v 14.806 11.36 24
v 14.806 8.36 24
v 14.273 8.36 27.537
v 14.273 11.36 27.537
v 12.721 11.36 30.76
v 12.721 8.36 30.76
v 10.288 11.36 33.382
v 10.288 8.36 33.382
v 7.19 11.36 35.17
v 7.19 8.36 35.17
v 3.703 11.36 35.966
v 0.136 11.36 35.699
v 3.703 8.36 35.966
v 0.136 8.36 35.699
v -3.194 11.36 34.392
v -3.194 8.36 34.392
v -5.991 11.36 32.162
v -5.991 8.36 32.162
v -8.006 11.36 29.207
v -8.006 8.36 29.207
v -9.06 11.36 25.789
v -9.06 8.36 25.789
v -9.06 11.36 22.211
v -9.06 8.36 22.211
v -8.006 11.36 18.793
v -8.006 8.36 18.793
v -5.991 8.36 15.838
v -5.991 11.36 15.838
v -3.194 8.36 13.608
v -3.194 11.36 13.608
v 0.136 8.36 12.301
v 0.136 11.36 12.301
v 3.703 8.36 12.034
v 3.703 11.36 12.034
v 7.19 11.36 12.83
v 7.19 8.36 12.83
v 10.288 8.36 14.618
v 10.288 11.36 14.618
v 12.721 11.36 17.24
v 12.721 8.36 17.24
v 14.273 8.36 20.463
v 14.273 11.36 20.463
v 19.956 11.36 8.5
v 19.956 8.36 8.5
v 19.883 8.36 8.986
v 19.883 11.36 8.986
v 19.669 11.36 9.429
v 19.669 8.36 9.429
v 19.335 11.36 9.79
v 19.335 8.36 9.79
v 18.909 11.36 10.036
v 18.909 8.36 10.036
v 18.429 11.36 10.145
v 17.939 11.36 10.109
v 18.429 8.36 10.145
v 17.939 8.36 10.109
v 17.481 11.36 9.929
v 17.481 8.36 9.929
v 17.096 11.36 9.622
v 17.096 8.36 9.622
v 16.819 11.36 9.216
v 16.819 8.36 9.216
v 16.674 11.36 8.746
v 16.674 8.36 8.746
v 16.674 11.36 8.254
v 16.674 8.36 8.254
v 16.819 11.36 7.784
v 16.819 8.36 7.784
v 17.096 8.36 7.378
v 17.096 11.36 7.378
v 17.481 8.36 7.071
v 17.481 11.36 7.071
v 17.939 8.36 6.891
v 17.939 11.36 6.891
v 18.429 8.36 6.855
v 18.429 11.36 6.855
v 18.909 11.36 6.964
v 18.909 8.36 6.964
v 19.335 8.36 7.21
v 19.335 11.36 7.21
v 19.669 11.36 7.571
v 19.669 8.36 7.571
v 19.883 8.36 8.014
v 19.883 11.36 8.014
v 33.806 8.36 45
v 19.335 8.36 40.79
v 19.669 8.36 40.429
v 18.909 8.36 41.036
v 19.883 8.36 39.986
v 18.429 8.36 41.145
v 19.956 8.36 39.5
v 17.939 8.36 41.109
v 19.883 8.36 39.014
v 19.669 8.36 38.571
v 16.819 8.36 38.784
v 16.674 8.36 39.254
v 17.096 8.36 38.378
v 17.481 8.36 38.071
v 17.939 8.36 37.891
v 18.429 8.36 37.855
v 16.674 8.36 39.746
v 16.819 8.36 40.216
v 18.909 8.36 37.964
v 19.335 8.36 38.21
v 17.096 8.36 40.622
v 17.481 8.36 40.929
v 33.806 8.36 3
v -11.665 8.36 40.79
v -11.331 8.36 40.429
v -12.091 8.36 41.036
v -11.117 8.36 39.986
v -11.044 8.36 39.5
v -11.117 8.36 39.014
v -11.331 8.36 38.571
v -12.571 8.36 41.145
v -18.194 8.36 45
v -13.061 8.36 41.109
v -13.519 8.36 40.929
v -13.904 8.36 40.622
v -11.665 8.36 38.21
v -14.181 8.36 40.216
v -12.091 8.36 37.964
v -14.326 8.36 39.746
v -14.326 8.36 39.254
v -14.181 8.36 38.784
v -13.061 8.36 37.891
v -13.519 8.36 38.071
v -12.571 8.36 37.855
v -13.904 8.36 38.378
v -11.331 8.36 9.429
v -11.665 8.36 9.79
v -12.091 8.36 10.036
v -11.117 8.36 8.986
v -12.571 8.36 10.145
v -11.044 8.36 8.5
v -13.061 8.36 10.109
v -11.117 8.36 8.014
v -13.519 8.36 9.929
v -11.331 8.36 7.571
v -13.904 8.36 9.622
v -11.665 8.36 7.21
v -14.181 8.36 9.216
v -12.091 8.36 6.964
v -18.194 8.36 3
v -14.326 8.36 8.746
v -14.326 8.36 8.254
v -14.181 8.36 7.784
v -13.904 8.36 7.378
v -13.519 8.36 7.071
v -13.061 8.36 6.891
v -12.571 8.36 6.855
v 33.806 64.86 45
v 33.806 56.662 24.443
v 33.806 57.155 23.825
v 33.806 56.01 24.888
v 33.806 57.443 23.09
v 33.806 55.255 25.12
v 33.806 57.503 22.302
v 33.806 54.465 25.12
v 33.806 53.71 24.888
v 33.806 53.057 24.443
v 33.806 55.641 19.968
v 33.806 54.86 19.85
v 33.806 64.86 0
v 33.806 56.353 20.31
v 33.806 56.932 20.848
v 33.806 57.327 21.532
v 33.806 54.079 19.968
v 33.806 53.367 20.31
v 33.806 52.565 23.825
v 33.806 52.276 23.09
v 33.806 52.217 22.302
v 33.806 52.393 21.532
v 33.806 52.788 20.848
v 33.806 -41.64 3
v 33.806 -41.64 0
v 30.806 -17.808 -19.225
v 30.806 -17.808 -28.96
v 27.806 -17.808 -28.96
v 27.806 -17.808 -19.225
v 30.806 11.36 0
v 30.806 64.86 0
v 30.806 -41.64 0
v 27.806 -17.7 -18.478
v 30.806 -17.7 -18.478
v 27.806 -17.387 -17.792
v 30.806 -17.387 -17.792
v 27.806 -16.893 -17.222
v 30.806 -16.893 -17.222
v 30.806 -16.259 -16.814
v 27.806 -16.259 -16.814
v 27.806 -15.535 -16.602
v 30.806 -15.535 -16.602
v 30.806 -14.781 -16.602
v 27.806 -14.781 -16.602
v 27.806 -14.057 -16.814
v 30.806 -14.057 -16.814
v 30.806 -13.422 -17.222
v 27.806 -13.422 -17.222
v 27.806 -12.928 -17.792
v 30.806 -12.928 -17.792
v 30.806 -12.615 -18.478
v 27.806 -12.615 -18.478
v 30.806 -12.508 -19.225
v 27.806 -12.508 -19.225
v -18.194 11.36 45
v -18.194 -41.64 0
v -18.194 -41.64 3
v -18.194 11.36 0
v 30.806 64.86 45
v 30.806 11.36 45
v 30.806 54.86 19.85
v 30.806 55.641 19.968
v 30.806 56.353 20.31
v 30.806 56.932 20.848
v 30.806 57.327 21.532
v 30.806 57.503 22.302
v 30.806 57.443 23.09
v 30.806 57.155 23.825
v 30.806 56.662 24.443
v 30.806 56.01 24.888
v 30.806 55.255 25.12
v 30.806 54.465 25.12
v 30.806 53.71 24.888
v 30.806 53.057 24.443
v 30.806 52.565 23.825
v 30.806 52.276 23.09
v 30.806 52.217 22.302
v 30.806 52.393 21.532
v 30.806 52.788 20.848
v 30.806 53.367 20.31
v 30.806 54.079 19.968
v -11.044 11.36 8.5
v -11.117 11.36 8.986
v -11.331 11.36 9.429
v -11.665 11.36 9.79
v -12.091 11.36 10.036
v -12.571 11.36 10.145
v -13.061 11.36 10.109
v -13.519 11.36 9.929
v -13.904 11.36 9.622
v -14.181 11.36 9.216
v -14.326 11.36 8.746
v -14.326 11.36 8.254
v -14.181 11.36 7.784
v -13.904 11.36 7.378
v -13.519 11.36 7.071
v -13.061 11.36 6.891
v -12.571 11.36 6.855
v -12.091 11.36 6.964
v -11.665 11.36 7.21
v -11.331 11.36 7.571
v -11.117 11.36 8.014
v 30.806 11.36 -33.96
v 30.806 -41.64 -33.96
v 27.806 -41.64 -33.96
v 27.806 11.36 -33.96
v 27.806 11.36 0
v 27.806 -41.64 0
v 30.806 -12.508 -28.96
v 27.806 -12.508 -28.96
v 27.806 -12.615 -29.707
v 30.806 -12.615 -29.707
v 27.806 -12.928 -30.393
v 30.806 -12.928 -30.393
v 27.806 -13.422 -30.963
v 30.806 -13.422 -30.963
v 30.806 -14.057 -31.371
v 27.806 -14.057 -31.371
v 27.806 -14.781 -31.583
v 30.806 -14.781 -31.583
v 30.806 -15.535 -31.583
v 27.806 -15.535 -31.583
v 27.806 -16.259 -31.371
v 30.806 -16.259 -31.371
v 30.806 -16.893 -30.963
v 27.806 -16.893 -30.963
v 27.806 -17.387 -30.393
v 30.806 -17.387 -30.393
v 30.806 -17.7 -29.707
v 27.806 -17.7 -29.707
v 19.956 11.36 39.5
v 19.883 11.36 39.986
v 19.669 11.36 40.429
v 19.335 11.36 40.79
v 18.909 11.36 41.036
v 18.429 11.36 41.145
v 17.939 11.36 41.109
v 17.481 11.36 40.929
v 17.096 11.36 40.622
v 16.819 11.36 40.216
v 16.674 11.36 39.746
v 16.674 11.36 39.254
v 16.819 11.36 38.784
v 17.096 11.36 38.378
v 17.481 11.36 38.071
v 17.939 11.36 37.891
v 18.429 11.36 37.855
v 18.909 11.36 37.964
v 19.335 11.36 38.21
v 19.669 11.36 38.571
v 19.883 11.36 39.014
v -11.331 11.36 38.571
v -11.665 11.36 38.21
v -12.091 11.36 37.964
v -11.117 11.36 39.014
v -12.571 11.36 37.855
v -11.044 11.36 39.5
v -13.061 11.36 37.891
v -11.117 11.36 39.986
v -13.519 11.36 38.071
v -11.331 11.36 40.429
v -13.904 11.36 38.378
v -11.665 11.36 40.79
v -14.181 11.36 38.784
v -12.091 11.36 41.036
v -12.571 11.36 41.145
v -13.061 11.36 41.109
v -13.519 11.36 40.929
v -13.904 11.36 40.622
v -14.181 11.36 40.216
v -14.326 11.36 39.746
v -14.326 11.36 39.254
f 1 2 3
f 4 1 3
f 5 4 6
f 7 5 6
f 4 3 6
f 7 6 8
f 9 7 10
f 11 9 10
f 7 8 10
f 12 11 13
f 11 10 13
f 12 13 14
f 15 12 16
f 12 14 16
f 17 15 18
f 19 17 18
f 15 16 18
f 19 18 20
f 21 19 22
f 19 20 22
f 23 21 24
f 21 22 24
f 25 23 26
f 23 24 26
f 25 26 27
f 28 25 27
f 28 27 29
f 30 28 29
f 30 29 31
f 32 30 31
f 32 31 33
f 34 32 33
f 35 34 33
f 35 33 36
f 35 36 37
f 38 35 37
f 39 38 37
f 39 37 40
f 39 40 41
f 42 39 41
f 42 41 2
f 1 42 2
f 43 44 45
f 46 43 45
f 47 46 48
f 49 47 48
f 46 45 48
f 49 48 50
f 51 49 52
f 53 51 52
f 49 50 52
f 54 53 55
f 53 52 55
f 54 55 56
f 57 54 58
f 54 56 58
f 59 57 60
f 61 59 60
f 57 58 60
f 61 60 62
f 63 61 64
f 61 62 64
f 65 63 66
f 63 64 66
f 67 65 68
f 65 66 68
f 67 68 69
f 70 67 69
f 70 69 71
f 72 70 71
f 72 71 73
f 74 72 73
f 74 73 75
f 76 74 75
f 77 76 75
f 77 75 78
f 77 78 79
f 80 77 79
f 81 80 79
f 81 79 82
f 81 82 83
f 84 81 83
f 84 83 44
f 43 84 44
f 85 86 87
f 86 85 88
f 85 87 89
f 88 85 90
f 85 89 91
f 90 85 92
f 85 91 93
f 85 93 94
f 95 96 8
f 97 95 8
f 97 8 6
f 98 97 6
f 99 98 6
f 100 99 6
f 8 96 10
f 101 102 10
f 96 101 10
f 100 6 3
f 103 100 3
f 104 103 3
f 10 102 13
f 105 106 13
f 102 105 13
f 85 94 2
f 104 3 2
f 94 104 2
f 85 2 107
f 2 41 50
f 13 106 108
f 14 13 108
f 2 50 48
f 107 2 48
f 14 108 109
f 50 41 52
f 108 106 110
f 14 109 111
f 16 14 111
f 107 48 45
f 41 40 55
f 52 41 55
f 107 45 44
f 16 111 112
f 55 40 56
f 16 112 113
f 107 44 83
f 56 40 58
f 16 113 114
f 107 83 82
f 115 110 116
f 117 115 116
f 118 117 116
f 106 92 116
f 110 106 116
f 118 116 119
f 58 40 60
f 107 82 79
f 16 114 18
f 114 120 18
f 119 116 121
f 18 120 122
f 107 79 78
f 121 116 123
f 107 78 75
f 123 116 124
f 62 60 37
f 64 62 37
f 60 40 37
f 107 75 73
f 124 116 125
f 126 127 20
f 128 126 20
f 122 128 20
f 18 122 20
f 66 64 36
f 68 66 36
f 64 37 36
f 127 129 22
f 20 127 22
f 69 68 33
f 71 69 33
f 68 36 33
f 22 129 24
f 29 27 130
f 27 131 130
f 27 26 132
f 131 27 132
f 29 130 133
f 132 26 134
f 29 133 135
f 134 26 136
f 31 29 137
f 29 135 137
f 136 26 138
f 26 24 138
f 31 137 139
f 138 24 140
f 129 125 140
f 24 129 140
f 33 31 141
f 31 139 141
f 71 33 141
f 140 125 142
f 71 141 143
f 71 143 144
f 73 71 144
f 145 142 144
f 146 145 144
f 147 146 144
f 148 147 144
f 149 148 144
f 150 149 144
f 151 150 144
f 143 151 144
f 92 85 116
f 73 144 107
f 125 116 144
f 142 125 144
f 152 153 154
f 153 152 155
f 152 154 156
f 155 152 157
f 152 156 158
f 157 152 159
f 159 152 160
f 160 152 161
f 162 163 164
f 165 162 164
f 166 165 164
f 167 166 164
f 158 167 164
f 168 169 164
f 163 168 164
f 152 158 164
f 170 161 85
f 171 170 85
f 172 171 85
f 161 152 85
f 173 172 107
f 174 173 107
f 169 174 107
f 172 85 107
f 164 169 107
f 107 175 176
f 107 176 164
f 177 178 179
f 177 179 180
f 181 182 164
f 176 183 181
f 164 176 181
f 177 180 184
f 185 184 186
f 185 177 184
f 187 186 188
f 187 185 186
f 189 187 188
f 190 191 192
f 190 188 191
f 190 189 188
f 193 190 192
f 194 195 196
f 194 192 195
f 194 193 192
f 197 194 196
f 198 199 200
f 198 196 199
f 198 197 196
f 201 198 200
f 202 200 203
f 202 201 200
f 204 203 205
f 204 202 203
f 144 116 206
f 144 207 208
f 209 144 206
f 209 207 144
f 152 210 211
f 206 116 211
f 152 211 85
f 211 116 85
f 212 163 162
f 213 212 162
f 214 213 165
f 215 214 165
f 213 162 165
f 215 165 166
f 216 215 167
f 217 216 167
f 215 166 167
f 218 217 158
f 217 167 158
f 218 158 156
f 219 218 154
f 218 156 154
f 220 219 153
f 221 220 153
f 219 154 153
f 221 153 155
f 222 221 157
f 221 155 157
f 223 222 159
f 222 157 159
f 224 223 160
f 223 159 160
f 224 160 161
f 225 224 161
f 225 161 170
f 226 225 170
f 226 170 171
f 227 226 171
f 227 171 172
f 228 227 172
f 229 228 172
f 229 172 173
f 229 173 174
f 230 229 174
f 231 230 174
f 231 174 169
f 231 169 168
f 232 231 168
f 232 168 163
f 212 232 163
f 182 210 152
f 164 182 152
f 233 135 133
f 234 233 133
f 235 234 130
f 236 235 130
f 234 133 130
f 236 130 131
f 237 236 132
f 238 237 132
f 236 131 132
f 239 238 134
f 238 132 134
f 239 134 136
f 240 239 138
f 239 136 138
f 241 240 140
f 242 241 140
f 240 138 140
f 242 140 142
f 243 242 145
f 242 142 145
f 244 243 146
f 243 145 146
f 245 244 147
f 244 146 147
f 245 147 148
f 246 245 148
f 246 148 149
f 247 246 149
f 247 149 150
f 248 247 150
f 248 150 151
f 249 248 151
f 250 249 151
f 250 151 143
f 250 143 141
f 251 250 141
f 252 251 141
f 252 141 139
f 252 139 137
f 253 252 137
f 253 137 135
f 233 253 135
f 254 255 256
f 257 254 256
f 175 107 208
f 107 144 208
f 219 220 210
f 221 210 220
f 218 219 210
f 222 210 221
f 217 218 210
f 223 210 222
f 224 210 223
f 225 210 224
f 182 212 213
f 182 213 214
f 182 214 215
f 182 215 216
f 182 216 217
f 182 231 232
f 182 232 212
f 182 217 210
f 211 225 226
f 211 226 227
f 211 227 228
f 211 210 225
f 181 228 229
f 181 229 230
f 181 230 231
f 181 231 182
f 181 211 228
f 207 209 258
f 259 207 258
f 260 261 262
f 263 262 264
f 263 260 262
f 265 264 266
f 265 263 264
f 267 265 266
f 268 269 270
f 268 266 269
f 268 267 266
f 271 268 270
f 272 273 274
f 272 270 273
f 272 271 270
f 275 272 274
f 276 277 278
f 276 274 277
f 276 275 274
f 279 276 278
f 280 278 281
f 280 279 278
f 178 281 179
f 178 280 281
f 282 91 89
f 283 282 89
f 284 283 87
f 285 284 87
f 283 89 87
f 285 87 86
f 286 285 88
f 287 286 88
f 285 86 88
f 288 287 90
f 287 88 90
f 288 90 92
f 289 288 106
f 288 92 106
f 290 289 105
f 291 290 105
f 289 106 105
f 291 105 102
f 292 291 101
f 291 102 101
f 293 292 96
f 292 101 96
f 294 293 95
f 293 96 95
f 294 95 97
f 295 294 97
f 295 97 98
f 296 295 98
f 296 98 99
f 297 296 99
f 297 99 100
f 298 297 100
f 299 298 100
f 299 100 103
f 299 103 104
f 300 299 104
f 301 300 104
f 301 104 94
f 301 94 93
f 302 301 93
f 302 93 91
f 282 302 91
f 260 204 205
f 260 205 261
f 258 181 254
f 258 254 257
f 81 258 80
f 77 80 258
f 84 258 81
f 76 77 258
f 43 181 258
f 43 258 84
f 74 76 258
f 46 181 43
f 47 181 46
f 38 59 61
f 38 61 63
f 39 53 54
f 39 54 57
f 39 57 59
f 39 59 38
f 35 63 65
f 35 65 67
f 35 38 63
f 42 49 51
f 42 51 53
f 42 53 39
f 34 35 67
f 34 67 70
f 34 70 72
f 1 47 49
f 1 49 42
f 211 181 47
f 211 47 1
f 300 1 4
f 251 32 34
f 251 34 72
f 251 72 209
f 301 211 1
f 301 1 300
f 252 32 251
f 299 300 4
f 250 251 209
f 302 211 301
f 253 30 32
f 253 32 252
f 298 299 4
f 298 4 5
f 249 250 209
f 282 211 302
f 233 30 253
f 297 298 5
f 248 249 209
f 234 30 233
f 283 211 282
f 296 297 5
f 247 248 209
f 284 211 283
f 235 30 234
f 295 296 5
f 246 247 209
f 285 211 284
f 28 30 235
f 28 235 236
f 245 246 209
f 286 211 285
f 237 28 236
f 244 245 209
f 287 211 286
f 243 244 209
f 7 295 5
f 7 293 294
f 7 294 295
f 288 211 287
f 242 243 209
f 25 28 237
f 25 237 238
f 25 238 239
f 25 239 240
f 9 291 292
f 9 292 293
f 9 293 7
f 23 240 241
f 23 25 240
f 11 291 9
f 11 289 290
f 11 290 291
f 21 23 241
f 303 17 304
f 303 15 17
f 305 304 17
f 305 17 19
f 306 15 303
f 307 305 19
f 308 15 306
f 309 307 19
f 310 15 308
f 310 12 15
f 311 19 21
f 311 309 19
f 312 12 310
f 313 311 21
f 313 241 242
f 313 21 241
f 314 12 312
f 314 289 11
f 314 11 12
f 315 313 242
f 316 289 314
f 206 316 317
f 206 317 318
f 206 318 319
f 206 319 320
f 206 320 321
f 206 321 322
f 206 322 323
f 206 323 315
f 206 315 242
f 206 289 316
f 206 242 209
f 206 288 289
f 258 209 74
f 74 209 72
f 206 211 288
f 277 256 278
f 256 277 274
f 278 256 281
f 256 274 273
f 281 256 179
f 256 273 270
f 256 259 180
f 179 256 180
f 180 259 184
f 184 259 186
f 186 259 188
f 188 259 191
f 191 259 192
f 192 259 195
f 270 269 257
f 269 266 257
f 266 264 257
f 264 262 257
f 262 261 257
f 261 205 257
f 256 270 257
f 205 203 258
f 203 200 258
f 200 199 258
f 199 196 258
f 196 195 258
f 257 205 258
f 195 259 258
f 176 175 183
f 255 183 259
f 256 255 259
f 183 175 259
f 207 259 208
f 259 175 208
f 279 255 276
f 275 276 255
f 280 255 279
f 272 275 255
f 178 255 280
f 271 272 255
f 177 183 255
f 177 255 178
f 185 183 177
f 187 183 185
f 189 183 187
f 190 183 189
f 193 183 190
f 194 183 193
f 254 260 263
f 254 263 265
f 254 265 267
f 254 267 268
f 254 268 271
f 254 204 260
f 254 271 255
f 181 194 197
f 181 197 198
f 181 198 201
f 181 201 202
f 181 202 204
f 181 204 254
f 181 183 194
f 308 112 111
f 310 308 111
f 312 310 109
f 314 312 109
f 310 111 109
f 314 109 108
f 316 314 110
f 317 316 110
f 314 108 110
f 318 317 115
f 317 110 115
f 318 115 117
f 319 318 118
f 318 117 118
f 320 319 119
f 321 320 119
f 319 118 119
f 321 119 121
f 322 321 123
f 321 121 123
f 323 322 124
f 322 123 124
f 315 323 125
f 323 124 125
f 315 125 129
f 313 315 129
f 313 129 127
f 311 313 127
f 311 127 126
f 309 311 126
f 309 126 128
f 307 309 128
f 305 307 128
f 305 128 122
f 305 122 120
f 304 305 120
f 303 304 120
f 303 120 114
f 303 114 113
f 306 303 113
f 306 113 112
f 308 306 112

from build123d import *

# Parameters (mm, degrees)
SKETCH_1_W          = 42
SKETCH_1_H          = 53
EXTRUDE_1_DEPTH     = 3
SKETCH_2_W          = 42
SKETCH_2_H          = 3
EXTRUDE_2_DEPTH     = 42
SKETCH_3_R          = 12
SKETCH_3_R_2        = 1.65
CUT_EXTRUDE_1_DEPTH = 4
EXTRUDE_3_DEPTH     = 10
SKETCH_5_W          = 3
SKETCH_5_H          = 45
EXTRUDE_4_DEPTH     = 53.5
SKETCH_6_R          = 2.65
CUT_EXTRUDE_2_DEPTH = 20
SKETCH_7_W          = 3
SKETCH_7_H          = 53
EXTRUDE_5_DEPTH     = 33.96
CUT_EXTRUDE_4_DEPTH = 33.96


with BuildPart() as part:
    # 草图1 → 凸台-拉伸1 (new body)
    with BuildSketch(Plane.XY):
        with Locations((2.806034483, -15.140086207)):
            Rectangle(SKETCH_1_W, SKETCH_1_H)
    extrude(amount=EXTRUDE_1_DEPTH)

    # 草图2 → 凸台-拉伸2 (add)
    with BuildSketch(Plane.XY.offset(3)):
        with Locations((2.806034483, 9.859913793)):
            Rectangle(SKETCH_2_W, SKETCH_2_H)
    extrude(amount=EXTRUDE_2_DEPTH)

    # 草图3 → 切除-拉伸1 (cut, through all)
    with BuildSketch(Plane.XZ.offset(-8.359913793)):
        with Locations((2.806034483, 24)):
            Circle(SKETCH_3_R)
        with Locations((18.306034483, 39.5)):
            Circle(SKETCH_3_R_2)
        with Locations((18.306034483, 8.5)):
            Circle(SKETCH_3_R_2)
        with Locations((-12.693965517, 8.5)):
            Circle(SKETCH_3_R_2)
        with Locations((-12.693965517, 39.5)):
            Circle(SKETCH_3_R_2)
    extrude(amount=-CUT_EXTRUDE_1_DEPTH, mode=Mode.SUBTRACT)

    # 草图4 → 凸台-拉伸3 (add)
    with BuildSketch(Plane(origin=(23.806034483, 0, 0), x_dir=(0, 0, -1), z_dir=(1, 0, 0))):
        Polygon((-45, 8.359913793), (-3, 8.359913793), (-3, -41.640086207), (0, -41.640086207), (0, 8.359913793), (0, 11.359913793), (-45, 11.359913793), align=None)
    extrude(amount=EXTRUDE_3_DEPTH)

    # 草图5 → 凸台-拉伸4 (add)
    with BuildSketch(Plane(origin=(0, 11.359913793, 0), x_dir=(1, 0, 0), z_dir=(0, 1, 0))):
        with Locations((32.306034483, -22.5)):
            Rectangle(SKETCH_5_W, SKETCH_5_H)
    extrude(amount=EXTRUDE_4_DEPTH)

    # 草图6 → 切除-拉伸2 (cut)
    with BuildSketch(Plane(origin=(33.806034483, 0, 0), x_dir=(0, 0, -1), z_dir=(1, 0, 0))):
        with Locations((-22.5, 54.859913793)):
            Circle(SKETCH_6_R)
    extrude(amount=-CUT_EXTRUDE_2_DEPTH, mode=Mode.SUBTRACT)

    # 草图7 → 凸台-拉伸5 (add)
    with BuildSketch(Plane(origin=(0, 0, 0), x_dir=(-1, 0, 0), z_dir=(0, 0, -1))):
        with Locations((-29.306034483, -15.140086207)):
            Rectangle(SKETCH_7_W, SKETCH_7_H)
    extrude(amount=EXTRUDE_5_DEPTH)

    # 草图10 → 切除-拉伸4 (cut)
    with BuildSketch(Plane(origin=(30.806034483, 0, 0), x_dir=(0, 0, -1), z_dir=(1, 0, 0))):
        with BuildLine():
            Line((28.96, -17.807711285), (19.224876223, -17.807711285))
            ThreePointArc((19.224876223, -17.807711285), (16.574876223, -15.157711285), (19.224876223, -12.507711285))
            Line((19.224876223, -12.507711285), (28.96, -12.507711285))
            ThreePointArc((28.96, -12.507711285), (31.61, -15.157711285), (28.96, -17.807711285))
        make_face()
    extrude(amount=-CUT_EXTRUDE_4_DEPTH, mode=Mode.SUBTRACT)


solid = part.part
